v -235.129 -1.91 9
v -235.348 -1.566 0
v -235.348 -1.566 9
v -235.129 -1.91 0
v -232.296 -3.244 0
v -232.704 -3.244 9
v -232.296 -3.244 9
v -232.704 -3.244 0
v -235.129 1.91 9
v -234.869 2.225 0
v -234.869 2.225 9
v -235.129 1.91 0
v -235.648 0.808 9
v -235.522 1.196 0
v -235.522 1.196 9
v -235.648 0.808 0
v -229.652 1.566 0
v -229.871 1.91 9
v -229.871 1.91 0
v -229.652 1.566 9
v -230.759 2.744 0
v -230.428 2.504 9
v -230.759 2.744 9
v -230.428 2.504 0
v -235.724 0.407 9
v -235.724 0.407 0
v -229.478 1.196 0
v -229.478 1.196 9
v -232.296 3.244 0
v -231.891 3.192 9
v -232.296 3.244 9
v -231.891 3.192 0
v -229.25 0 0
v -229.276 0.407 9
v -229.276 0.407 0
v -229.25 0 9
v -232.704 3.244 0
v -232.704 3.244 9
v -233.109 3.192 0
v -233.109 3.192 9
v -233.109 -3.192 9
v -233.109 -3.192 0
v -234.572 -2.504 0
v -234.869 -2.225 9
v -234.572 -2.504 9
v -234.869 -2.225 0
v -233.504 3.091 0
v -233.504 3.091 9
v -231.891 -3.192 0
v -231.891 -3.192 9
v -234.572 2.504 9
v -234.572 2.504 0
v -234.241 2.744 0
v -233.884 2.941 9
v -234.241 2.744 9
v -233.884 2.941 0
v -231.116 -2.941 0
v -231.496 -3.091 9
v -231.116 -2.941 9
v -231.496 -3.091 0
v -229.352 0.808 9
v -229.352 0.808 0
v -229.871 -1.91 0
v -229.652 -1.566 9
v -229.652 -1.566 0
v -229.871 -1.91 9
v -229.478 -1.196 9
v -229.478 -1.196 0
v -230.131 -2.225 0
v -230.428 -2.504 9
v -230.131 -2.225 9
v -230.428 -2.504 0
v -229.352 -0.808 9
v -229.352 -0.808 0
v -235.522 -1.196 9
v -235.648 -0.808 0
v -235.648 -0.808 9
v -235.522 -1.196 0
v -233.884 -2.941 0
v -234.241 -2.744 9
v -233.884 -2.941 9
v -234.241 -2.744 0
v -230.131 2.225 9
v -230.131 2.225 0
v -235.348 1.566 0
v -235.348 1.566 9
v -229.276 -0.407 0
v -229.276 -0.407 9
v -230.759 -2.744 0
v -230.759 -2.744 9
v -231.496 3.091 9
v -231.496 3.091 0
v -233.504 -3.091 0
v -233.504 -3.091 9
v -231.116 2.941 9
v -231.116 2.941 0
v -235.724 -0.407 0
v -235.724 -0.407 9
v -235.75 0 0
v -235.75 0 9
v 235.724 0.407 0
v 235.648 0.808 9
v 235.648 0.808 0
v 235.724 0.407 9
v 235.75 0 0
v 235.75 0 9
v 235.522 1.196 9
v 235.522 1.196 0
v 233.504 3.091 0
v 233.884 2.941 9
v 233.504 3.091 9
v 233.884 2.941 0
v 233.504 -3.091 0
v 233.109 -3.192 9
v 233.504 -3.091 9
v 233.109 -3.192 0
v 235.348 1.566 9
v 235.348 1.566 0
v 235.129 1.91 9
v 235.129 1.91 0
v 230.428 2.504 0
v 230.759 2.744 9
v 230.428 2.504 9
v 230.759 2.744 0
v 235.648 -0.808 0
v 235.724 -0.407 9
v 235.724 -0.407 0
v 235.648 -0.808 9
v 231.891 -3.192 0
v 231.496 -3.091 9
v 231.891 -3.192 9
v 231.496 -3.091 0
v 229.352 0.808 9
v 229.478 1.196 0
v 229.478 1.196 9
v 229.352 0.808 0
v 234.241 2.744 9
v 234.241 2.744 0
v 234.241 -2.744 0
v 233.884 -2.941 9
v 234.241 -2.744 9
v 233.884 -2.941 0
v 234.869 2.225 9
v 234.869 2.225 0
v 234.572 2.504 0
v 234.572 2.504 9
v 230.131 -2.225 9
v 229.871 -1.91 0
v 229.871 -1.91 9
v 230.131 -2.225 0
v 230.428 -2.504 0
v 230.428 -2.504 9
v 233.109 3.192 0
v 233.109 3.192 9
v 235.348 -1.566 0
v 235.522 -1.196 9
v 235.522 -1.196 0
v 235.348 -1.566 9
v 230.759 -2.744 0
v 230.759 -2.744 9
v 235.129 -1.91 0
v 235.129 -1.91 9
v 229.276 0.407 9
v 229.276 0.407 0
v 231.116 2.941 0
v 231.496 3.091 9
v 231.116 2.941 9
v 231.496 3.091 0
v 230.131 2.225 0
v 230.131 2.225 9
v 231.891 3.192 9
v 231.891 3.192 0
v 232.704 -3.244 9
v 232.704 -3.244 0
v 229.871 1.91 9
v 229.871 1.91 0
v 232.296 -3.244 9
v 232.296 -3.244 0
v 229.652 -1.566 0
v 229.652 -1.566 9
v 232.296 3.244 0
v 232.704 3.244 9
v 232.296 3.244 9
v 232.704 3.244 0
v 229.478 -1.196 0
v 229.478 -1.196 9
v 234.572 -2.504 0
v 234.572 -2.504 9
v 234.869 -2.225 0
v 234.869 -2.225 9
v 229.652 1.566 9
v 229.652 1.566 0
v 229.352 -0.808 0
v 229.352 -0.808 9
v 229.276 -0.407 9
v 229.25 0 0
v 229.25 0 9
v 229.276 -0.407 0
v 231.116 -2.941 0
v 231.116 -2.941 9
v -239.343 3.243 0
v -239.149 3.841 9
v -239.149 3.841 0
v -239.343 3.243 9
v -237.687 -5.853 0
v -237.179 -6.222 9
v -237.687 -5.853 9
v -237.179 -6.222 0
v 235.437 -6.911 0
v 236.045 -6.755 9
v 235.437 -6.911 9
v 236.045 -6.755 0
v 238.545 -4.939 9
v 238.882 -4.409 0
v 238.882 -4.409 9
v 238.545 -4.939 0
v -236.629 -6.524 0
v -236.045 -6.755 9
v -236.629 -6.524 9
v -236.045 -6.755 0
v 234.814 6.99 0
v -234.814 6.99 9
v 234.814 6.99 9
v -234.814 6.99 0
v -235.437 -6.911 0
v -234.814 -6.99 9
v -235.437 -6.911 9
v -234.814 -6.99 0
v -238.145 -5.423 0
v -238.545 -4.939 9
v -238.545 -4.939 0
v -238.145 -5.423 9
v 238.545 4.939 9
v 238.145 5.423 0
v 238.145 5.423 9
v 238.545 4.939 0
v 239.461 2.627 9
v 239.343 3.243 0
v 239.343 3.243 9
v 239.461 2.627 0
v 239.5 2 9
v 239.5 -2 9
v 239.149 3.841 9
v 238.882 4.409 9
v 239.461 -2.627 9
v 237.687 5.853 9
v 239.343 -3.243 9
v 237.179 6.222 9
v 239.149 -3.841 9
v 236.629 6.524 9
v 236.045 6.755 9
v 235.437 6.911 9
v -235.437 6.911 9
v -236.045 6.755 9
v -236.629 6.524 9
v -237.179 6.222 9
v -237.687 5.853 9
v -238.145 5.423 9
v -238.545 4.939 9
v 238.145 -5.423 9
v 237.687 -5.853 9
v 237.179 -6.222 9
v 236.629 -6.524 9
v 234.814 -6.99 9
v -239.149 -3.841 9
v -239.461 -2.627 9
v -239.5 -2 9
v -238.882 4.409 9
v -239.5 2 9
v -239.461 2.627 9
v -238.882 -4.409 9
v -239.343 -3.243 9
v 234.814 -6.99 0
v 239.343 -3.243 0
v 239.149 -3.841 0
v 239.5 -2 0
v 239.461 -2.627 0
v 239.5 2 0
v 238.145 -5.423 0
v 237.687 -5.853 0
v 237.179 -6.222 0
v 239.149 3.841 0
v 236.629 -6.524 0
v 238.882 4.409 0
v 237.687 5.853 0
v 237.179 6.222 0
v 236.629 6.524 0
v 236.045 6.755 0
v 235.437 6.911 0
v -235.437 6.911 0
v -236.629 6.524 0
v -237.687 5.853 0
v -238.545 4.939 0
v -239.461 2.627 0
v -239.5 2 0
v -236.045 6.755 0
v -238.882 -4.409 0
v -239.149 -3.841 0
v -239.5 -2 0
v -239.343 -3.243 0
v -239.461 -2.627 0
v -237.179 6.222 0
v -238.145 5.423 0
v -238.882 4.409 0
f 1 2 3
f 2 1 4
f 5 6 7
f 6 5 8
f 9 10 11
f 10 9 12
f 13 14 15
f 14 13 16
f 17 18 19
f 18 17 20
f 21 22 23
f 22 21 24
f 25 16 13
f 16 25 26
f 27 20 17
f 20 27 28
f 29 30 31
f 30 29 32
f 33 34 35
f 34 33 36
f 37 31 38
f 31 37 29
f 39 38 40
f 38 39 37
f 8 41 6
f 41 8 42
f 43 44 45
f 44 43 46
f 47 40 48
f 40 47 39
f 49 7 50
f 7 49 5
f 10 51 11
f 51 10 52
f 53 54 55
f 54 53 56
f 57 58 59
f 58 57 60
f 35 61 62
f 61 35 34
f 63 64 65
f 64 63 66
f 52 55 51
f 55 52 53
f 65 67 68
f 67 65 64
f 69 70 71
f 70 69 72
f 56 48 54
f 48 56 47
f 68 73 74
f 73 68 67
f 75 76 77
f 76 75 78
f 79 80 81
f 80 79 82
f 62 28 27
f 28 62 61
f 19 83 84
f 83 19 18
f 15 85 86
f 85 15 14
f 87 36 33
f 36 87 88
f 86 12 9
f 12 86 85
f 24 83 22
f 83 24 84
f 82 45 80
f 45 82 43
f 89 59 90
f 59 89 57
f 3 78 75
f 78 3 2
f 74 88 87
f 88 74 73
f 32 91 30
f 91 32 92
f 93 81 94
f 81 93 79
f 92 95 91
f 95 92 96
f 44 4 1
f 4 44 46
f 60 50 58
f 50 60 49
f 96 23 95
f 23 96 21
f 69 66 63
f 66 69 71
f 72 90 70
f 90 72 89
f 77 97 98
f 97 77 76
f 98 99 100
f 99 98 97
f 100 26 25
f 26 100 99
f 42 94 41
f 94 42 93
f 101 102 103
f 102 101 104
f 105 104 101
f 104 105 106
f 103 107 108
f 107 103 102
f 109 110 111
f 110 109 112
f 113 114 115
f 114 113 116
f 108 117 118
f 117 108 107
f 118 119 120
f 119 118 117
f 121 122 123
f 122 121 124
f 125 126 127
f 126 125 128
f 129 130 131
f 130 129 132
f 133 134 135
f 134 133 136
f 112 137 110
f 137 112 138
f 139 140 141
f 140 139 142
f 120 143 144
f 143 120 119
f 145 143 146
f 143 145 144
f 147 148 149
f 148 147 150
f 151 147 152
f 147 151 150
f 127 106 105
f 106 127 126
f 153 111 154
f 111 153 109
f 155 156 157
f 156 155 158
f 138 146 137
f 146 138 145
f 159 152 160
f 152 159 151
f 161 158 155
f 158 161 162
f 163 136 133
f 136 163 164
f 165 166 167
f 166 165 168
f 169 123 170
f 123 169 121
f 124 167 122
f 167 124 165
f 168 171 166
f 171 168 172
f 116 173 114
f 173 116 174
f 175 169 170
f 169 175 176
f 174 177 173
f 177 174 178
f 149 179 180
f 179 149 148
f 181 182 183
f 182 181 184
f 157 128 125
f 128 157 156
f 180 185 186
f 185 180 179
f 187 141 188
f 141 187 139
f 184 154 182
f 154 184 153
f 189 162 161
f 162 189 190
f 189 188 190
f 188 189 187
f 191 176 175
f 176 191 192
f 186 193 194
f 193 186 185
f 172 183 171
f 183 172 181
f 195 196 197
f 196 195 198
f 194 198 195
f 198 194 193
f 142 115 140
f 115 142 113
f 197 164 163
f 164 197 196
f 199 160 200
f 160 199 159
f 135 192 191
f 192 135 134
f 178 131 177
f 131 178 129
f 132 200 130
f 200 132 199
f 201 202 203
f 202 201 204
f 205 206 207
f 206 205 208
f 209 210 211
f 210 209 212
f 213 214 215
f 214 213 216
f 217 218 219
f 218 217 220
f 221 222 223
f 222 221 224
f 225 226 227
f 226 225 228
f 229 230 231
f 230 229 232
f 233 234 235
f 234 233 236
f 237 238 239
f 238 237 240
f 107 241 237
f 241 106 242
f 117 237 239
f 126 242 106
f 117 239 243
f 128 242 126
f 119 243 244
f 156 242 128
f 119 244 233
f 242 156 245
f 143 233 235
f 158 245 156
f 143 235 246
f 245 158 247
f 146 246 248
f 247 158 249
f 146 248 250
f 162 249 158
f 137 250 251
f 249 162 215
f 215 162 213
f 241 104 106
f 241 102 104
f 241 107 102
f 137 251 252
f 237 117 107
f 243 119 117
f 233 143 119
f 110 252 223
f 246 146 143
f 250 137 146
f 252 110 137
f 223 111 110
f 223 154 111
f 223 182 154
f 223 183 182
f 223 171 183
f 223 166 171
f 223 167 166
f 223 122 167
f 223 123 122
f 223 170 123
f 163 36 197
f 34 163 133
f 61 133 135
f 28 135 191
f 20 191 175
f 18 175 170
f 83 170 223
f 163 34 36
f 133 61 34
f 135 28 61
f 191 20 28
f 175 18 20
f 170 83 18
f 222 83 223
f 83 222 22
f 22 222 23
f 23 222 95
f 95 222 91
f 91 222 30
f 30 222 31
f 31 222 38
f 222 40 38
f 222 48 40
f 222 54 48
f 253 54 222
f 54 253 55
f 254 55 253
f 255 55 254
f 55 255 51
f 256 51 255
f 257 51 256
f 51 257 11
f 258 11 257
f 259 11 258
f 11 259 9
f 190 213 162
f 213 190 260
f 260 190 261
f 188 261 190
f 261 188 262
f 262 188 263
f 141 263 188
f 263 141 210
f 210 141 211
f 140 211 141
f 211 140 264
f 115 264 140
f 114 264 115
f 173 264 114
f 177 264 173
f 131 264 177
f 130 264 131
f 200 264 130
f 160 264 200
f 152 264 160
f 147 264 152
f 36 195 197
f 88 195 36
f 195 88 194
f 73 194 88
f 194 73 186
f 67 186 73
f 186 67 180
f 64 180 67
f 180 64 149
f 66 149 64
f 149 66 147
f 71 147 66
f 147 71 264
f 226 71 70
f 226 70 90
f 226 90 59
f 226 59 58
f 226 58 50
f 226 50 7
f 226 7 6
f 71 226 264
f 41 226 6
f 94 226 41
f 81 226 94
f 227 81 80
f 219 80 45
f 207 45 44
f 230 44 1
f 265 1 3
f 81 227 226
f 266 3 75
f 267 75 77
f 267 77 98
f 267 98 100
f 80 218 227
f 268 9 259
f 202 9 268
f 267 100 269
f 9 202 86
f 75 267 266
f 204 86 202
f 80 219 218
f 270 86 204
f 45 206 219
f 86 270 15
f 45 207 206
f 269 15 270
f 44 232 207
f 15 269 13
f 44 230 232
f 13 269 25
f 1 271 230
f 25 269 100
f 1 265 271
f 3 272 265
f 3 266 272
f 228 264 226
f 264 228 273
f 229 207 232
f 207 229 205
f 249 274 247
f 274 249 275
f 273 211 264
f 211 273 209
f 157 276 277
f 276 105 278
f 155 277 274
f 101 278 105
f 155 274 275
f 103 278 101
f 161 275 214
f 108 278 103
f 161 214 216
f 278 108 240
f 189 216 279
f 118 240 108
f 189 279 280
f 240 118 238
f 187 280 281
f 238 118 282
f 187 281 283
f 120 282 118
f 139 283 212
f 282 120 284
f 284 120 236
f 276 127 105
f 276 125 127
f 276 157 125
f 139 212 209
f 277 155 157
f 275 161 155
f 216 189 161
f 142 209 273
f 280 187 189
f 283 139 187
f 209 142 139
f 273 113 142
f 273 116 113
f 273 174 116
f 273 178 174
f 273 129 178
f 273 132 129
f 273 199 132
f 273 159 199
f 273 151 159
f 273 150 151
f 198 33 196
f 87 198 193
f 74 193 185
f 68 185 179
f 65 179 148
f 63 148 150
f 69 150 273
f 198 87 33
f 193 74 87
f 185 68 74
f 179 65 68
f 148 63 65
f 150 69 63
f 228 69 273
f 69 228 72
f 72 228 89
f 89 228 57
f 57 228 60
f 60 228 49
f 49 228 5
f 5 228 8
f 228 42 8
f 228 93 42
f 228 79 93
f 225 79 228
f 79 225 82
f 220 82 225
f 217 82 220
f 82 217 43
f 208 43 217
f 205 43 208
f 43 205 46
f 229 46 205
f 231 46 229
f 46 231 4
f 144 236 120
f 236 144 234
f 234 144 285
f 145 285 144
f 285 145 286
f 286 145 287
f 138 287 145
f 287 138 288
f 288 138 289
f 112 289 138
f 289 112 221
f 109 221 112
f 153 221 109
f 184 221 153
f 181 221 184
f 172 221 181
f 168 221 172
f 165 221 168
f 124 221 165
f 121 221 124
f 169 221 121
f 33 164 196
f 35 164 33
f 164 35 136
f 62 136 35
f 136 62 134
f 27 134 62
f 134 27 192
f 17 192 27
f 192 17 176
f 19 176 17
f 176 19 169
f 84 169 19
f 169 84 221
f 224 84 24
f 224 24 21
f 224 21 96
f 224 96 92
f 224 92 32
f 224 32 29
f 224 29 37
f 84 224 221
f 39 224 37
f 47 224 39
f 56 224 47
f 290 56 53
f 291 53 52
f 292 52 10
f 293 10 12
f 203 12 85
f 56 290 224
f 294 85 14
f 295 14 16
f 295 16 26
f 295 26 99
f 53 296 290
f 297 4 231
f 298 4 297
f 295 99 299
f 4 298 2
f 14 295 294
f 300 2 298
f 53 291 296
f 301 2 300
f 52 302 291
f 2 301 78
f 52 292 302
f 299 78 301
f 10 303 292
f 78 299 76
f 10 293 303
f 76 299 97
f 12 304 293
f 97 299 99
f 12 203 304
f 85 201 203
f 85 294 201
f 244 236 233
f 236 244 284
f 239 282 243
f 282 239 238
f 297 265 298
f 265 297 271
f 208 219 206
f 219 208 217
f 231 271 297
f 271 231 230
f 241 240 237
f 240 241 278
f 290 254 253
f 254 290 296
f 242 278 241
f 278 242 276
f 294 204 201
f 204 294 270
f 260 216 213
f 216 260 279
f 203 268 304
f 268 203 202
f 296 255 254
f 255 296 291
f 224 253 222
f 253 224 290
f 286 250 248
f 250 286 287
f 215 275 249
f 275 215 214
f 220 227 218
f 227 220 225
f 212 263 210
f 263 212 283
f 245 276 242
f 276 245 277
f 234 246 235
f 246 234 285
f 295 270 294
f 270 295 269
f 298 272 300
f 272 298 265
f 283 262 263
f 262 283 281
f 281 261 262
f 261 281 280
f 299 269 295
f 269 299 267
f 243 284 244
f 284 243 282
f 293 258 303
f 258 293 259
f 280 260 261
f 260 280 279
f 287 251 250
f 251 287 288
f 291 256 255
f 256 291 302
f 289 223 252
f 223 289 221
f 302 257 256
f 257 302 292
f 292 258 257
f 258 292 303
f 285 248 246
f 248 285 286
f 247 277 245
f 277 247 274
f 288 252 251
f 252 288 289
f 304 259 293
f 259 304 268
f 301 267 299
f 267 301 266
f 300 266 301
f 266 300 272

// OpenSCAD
$fn = 50;


difference() {
	union() {
		hull() {
			translate(v = [-234.5000000000, 2.0000000000, 0]) {
				cylinder(h = 9, r = 5);
			}
			translate(v = [234.5000000000, 2.0000000000, 0]) {
				cylinder(h = 9, r = 5);
			}
			translate(v = [-234.5000000000, -2.0000000000, 0]) {
				cylinder(h = 9, r = 5);
			}
			translate(v = [234.5000000000, -2.0000000000, 0]) {
				cylinder(h = 9, r = 5);
			}
		}
	}
	union() {
		translate(v = [-232.5000000000, 0.0000000000, -100.0000000000]) {
			cylinder(h = 200, r = 3.2500000000);
		}
		translate(v = [-232.5000000000, 0.0000000000, -100.0000000000]) {
			cylinder(h = 200, r = 3.2500000000);
		}
		translate(v = [232.5000000000, 0.0000000000, -100.0000000000]) {
			cylinder(h = 200, r = 3.2500000000);
		}
		translate(v = [232.5000000000, 0.0000000000, -100.0000000000]) {
			cylinder(h = 200, r = 3.2500000000);
		}
	}
}
